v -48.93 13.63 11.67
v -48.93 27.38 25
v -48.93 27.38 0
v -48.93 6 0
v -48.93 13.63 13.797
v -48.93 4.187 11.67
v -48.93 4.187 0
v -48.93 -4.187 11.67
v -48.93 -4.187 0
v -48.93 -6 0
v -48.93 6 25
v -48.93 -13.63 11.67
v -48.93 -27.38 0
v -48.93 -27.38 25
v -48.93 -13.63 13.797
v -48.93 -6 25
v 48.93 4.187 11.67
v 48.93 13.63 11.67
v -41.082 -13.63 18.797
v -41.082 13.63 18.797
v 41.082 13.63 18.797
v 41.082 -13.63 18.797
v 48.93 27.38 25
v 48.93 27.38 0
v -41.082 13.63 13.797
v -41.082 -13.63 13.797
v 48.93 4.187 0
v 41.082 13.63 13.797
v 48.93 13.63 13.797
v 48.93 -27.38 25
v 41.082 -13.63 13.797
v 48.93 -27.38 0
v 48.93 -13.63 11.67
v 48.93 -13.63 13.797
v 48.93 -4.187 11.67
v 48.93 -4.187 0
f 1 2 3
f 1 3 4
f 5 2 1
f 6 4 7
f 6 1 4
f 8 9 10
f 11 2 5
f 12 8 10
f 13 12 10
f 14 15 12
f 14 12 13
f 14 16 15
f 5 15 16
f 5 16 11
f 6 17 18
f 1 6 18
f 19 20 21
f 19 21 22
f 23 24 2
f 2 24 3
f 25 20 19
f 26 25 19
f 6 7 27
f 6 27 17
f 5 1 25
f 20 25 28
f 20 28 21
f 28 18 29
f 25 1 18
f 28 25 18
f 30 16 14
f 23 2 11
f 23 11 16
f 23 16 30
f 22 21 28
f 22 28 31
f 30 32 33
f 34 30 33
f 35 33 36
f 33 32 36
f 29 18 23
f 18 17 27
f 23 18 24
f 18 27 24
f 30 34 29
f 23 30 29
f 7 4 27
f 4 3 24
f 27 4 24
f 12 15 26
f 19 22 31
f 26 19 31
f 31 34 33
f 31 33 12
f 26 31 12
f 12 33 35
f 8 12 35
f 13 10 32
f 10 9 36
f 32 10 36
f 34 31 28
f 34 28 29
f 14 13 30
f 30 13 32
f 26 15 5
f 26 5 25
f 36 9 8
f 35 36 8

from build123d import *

# Parameters (mm, degrees)
F0_W     = 31.6056316875
F0_H     = 12
F1_DEPTH = 25
F2_W     = 8.3738705143
F2_H     = 14.6988127381
F3_DEPTH = 166
F4_W     = 7.847521259
F4_H     = 27.2596180439
F5_DEPTH = 5


# Not quite as in the source:
# - an extrude ends at something that could not be found from the text; its depth is read off the source's solid


with BuildPart() as f1:
    # F0 (on Top) → F1 (new body)
    with BuildSketch(Plane.XY):
        Polygon((48.9295756356, -27.3802791548), (48.9295756356, 27.3802791548), (-48.9295756356, 27.3802791548), (-48.9295756356, 6), (-17.3239439482, 6), (-17.3239439482, -6), (-48.9295756356, -6), (-48.9295756356, -27.3802791548), align=None)
        with Locations((-33.1267597919, 0)):
            Rectangle(F0_W, F0_H)
    extrude(amount=F1_DEPTH)

    # F2 (on face) → F3 (cut, through all)
    with BuildSketch(Plane.YZ.offset(48.9295756356)):
        with Locations((0, -7.349406369)):
            Rectangle(F2_W, F2_H)
        Polygon((13.6298090219, 11.6699673235), (13.6298090219, 18.7966637313), (-13.6298090219, 18.7966637313), (-13.6298090219, 11.6699673235), (-4.1869352572, 11.6699673235), (-4.1869352572, 0), (4.1869352572, 0), (4.1869352572, 11.6699673235), align=None)
    extrude(amount=-F3_DEPTH, mode=Mode.SUBTRACT)

    # F4 (on face) → F5 (join)
    with BuildSketch(Plane(origin=(0, 0, 18.7966637313), x_dir=(1, 0, 0), z_dir=(0, 0, -1))):
        with Locations((-45.0058150061, 0)):
            Rectangle(F4_W, F4_H)
        with Locations((45.0058150061, 0)):
            Rectangle(F4_W, F4_H)
    extrude(amount=F5_DEPTH)


solid = f1.part
